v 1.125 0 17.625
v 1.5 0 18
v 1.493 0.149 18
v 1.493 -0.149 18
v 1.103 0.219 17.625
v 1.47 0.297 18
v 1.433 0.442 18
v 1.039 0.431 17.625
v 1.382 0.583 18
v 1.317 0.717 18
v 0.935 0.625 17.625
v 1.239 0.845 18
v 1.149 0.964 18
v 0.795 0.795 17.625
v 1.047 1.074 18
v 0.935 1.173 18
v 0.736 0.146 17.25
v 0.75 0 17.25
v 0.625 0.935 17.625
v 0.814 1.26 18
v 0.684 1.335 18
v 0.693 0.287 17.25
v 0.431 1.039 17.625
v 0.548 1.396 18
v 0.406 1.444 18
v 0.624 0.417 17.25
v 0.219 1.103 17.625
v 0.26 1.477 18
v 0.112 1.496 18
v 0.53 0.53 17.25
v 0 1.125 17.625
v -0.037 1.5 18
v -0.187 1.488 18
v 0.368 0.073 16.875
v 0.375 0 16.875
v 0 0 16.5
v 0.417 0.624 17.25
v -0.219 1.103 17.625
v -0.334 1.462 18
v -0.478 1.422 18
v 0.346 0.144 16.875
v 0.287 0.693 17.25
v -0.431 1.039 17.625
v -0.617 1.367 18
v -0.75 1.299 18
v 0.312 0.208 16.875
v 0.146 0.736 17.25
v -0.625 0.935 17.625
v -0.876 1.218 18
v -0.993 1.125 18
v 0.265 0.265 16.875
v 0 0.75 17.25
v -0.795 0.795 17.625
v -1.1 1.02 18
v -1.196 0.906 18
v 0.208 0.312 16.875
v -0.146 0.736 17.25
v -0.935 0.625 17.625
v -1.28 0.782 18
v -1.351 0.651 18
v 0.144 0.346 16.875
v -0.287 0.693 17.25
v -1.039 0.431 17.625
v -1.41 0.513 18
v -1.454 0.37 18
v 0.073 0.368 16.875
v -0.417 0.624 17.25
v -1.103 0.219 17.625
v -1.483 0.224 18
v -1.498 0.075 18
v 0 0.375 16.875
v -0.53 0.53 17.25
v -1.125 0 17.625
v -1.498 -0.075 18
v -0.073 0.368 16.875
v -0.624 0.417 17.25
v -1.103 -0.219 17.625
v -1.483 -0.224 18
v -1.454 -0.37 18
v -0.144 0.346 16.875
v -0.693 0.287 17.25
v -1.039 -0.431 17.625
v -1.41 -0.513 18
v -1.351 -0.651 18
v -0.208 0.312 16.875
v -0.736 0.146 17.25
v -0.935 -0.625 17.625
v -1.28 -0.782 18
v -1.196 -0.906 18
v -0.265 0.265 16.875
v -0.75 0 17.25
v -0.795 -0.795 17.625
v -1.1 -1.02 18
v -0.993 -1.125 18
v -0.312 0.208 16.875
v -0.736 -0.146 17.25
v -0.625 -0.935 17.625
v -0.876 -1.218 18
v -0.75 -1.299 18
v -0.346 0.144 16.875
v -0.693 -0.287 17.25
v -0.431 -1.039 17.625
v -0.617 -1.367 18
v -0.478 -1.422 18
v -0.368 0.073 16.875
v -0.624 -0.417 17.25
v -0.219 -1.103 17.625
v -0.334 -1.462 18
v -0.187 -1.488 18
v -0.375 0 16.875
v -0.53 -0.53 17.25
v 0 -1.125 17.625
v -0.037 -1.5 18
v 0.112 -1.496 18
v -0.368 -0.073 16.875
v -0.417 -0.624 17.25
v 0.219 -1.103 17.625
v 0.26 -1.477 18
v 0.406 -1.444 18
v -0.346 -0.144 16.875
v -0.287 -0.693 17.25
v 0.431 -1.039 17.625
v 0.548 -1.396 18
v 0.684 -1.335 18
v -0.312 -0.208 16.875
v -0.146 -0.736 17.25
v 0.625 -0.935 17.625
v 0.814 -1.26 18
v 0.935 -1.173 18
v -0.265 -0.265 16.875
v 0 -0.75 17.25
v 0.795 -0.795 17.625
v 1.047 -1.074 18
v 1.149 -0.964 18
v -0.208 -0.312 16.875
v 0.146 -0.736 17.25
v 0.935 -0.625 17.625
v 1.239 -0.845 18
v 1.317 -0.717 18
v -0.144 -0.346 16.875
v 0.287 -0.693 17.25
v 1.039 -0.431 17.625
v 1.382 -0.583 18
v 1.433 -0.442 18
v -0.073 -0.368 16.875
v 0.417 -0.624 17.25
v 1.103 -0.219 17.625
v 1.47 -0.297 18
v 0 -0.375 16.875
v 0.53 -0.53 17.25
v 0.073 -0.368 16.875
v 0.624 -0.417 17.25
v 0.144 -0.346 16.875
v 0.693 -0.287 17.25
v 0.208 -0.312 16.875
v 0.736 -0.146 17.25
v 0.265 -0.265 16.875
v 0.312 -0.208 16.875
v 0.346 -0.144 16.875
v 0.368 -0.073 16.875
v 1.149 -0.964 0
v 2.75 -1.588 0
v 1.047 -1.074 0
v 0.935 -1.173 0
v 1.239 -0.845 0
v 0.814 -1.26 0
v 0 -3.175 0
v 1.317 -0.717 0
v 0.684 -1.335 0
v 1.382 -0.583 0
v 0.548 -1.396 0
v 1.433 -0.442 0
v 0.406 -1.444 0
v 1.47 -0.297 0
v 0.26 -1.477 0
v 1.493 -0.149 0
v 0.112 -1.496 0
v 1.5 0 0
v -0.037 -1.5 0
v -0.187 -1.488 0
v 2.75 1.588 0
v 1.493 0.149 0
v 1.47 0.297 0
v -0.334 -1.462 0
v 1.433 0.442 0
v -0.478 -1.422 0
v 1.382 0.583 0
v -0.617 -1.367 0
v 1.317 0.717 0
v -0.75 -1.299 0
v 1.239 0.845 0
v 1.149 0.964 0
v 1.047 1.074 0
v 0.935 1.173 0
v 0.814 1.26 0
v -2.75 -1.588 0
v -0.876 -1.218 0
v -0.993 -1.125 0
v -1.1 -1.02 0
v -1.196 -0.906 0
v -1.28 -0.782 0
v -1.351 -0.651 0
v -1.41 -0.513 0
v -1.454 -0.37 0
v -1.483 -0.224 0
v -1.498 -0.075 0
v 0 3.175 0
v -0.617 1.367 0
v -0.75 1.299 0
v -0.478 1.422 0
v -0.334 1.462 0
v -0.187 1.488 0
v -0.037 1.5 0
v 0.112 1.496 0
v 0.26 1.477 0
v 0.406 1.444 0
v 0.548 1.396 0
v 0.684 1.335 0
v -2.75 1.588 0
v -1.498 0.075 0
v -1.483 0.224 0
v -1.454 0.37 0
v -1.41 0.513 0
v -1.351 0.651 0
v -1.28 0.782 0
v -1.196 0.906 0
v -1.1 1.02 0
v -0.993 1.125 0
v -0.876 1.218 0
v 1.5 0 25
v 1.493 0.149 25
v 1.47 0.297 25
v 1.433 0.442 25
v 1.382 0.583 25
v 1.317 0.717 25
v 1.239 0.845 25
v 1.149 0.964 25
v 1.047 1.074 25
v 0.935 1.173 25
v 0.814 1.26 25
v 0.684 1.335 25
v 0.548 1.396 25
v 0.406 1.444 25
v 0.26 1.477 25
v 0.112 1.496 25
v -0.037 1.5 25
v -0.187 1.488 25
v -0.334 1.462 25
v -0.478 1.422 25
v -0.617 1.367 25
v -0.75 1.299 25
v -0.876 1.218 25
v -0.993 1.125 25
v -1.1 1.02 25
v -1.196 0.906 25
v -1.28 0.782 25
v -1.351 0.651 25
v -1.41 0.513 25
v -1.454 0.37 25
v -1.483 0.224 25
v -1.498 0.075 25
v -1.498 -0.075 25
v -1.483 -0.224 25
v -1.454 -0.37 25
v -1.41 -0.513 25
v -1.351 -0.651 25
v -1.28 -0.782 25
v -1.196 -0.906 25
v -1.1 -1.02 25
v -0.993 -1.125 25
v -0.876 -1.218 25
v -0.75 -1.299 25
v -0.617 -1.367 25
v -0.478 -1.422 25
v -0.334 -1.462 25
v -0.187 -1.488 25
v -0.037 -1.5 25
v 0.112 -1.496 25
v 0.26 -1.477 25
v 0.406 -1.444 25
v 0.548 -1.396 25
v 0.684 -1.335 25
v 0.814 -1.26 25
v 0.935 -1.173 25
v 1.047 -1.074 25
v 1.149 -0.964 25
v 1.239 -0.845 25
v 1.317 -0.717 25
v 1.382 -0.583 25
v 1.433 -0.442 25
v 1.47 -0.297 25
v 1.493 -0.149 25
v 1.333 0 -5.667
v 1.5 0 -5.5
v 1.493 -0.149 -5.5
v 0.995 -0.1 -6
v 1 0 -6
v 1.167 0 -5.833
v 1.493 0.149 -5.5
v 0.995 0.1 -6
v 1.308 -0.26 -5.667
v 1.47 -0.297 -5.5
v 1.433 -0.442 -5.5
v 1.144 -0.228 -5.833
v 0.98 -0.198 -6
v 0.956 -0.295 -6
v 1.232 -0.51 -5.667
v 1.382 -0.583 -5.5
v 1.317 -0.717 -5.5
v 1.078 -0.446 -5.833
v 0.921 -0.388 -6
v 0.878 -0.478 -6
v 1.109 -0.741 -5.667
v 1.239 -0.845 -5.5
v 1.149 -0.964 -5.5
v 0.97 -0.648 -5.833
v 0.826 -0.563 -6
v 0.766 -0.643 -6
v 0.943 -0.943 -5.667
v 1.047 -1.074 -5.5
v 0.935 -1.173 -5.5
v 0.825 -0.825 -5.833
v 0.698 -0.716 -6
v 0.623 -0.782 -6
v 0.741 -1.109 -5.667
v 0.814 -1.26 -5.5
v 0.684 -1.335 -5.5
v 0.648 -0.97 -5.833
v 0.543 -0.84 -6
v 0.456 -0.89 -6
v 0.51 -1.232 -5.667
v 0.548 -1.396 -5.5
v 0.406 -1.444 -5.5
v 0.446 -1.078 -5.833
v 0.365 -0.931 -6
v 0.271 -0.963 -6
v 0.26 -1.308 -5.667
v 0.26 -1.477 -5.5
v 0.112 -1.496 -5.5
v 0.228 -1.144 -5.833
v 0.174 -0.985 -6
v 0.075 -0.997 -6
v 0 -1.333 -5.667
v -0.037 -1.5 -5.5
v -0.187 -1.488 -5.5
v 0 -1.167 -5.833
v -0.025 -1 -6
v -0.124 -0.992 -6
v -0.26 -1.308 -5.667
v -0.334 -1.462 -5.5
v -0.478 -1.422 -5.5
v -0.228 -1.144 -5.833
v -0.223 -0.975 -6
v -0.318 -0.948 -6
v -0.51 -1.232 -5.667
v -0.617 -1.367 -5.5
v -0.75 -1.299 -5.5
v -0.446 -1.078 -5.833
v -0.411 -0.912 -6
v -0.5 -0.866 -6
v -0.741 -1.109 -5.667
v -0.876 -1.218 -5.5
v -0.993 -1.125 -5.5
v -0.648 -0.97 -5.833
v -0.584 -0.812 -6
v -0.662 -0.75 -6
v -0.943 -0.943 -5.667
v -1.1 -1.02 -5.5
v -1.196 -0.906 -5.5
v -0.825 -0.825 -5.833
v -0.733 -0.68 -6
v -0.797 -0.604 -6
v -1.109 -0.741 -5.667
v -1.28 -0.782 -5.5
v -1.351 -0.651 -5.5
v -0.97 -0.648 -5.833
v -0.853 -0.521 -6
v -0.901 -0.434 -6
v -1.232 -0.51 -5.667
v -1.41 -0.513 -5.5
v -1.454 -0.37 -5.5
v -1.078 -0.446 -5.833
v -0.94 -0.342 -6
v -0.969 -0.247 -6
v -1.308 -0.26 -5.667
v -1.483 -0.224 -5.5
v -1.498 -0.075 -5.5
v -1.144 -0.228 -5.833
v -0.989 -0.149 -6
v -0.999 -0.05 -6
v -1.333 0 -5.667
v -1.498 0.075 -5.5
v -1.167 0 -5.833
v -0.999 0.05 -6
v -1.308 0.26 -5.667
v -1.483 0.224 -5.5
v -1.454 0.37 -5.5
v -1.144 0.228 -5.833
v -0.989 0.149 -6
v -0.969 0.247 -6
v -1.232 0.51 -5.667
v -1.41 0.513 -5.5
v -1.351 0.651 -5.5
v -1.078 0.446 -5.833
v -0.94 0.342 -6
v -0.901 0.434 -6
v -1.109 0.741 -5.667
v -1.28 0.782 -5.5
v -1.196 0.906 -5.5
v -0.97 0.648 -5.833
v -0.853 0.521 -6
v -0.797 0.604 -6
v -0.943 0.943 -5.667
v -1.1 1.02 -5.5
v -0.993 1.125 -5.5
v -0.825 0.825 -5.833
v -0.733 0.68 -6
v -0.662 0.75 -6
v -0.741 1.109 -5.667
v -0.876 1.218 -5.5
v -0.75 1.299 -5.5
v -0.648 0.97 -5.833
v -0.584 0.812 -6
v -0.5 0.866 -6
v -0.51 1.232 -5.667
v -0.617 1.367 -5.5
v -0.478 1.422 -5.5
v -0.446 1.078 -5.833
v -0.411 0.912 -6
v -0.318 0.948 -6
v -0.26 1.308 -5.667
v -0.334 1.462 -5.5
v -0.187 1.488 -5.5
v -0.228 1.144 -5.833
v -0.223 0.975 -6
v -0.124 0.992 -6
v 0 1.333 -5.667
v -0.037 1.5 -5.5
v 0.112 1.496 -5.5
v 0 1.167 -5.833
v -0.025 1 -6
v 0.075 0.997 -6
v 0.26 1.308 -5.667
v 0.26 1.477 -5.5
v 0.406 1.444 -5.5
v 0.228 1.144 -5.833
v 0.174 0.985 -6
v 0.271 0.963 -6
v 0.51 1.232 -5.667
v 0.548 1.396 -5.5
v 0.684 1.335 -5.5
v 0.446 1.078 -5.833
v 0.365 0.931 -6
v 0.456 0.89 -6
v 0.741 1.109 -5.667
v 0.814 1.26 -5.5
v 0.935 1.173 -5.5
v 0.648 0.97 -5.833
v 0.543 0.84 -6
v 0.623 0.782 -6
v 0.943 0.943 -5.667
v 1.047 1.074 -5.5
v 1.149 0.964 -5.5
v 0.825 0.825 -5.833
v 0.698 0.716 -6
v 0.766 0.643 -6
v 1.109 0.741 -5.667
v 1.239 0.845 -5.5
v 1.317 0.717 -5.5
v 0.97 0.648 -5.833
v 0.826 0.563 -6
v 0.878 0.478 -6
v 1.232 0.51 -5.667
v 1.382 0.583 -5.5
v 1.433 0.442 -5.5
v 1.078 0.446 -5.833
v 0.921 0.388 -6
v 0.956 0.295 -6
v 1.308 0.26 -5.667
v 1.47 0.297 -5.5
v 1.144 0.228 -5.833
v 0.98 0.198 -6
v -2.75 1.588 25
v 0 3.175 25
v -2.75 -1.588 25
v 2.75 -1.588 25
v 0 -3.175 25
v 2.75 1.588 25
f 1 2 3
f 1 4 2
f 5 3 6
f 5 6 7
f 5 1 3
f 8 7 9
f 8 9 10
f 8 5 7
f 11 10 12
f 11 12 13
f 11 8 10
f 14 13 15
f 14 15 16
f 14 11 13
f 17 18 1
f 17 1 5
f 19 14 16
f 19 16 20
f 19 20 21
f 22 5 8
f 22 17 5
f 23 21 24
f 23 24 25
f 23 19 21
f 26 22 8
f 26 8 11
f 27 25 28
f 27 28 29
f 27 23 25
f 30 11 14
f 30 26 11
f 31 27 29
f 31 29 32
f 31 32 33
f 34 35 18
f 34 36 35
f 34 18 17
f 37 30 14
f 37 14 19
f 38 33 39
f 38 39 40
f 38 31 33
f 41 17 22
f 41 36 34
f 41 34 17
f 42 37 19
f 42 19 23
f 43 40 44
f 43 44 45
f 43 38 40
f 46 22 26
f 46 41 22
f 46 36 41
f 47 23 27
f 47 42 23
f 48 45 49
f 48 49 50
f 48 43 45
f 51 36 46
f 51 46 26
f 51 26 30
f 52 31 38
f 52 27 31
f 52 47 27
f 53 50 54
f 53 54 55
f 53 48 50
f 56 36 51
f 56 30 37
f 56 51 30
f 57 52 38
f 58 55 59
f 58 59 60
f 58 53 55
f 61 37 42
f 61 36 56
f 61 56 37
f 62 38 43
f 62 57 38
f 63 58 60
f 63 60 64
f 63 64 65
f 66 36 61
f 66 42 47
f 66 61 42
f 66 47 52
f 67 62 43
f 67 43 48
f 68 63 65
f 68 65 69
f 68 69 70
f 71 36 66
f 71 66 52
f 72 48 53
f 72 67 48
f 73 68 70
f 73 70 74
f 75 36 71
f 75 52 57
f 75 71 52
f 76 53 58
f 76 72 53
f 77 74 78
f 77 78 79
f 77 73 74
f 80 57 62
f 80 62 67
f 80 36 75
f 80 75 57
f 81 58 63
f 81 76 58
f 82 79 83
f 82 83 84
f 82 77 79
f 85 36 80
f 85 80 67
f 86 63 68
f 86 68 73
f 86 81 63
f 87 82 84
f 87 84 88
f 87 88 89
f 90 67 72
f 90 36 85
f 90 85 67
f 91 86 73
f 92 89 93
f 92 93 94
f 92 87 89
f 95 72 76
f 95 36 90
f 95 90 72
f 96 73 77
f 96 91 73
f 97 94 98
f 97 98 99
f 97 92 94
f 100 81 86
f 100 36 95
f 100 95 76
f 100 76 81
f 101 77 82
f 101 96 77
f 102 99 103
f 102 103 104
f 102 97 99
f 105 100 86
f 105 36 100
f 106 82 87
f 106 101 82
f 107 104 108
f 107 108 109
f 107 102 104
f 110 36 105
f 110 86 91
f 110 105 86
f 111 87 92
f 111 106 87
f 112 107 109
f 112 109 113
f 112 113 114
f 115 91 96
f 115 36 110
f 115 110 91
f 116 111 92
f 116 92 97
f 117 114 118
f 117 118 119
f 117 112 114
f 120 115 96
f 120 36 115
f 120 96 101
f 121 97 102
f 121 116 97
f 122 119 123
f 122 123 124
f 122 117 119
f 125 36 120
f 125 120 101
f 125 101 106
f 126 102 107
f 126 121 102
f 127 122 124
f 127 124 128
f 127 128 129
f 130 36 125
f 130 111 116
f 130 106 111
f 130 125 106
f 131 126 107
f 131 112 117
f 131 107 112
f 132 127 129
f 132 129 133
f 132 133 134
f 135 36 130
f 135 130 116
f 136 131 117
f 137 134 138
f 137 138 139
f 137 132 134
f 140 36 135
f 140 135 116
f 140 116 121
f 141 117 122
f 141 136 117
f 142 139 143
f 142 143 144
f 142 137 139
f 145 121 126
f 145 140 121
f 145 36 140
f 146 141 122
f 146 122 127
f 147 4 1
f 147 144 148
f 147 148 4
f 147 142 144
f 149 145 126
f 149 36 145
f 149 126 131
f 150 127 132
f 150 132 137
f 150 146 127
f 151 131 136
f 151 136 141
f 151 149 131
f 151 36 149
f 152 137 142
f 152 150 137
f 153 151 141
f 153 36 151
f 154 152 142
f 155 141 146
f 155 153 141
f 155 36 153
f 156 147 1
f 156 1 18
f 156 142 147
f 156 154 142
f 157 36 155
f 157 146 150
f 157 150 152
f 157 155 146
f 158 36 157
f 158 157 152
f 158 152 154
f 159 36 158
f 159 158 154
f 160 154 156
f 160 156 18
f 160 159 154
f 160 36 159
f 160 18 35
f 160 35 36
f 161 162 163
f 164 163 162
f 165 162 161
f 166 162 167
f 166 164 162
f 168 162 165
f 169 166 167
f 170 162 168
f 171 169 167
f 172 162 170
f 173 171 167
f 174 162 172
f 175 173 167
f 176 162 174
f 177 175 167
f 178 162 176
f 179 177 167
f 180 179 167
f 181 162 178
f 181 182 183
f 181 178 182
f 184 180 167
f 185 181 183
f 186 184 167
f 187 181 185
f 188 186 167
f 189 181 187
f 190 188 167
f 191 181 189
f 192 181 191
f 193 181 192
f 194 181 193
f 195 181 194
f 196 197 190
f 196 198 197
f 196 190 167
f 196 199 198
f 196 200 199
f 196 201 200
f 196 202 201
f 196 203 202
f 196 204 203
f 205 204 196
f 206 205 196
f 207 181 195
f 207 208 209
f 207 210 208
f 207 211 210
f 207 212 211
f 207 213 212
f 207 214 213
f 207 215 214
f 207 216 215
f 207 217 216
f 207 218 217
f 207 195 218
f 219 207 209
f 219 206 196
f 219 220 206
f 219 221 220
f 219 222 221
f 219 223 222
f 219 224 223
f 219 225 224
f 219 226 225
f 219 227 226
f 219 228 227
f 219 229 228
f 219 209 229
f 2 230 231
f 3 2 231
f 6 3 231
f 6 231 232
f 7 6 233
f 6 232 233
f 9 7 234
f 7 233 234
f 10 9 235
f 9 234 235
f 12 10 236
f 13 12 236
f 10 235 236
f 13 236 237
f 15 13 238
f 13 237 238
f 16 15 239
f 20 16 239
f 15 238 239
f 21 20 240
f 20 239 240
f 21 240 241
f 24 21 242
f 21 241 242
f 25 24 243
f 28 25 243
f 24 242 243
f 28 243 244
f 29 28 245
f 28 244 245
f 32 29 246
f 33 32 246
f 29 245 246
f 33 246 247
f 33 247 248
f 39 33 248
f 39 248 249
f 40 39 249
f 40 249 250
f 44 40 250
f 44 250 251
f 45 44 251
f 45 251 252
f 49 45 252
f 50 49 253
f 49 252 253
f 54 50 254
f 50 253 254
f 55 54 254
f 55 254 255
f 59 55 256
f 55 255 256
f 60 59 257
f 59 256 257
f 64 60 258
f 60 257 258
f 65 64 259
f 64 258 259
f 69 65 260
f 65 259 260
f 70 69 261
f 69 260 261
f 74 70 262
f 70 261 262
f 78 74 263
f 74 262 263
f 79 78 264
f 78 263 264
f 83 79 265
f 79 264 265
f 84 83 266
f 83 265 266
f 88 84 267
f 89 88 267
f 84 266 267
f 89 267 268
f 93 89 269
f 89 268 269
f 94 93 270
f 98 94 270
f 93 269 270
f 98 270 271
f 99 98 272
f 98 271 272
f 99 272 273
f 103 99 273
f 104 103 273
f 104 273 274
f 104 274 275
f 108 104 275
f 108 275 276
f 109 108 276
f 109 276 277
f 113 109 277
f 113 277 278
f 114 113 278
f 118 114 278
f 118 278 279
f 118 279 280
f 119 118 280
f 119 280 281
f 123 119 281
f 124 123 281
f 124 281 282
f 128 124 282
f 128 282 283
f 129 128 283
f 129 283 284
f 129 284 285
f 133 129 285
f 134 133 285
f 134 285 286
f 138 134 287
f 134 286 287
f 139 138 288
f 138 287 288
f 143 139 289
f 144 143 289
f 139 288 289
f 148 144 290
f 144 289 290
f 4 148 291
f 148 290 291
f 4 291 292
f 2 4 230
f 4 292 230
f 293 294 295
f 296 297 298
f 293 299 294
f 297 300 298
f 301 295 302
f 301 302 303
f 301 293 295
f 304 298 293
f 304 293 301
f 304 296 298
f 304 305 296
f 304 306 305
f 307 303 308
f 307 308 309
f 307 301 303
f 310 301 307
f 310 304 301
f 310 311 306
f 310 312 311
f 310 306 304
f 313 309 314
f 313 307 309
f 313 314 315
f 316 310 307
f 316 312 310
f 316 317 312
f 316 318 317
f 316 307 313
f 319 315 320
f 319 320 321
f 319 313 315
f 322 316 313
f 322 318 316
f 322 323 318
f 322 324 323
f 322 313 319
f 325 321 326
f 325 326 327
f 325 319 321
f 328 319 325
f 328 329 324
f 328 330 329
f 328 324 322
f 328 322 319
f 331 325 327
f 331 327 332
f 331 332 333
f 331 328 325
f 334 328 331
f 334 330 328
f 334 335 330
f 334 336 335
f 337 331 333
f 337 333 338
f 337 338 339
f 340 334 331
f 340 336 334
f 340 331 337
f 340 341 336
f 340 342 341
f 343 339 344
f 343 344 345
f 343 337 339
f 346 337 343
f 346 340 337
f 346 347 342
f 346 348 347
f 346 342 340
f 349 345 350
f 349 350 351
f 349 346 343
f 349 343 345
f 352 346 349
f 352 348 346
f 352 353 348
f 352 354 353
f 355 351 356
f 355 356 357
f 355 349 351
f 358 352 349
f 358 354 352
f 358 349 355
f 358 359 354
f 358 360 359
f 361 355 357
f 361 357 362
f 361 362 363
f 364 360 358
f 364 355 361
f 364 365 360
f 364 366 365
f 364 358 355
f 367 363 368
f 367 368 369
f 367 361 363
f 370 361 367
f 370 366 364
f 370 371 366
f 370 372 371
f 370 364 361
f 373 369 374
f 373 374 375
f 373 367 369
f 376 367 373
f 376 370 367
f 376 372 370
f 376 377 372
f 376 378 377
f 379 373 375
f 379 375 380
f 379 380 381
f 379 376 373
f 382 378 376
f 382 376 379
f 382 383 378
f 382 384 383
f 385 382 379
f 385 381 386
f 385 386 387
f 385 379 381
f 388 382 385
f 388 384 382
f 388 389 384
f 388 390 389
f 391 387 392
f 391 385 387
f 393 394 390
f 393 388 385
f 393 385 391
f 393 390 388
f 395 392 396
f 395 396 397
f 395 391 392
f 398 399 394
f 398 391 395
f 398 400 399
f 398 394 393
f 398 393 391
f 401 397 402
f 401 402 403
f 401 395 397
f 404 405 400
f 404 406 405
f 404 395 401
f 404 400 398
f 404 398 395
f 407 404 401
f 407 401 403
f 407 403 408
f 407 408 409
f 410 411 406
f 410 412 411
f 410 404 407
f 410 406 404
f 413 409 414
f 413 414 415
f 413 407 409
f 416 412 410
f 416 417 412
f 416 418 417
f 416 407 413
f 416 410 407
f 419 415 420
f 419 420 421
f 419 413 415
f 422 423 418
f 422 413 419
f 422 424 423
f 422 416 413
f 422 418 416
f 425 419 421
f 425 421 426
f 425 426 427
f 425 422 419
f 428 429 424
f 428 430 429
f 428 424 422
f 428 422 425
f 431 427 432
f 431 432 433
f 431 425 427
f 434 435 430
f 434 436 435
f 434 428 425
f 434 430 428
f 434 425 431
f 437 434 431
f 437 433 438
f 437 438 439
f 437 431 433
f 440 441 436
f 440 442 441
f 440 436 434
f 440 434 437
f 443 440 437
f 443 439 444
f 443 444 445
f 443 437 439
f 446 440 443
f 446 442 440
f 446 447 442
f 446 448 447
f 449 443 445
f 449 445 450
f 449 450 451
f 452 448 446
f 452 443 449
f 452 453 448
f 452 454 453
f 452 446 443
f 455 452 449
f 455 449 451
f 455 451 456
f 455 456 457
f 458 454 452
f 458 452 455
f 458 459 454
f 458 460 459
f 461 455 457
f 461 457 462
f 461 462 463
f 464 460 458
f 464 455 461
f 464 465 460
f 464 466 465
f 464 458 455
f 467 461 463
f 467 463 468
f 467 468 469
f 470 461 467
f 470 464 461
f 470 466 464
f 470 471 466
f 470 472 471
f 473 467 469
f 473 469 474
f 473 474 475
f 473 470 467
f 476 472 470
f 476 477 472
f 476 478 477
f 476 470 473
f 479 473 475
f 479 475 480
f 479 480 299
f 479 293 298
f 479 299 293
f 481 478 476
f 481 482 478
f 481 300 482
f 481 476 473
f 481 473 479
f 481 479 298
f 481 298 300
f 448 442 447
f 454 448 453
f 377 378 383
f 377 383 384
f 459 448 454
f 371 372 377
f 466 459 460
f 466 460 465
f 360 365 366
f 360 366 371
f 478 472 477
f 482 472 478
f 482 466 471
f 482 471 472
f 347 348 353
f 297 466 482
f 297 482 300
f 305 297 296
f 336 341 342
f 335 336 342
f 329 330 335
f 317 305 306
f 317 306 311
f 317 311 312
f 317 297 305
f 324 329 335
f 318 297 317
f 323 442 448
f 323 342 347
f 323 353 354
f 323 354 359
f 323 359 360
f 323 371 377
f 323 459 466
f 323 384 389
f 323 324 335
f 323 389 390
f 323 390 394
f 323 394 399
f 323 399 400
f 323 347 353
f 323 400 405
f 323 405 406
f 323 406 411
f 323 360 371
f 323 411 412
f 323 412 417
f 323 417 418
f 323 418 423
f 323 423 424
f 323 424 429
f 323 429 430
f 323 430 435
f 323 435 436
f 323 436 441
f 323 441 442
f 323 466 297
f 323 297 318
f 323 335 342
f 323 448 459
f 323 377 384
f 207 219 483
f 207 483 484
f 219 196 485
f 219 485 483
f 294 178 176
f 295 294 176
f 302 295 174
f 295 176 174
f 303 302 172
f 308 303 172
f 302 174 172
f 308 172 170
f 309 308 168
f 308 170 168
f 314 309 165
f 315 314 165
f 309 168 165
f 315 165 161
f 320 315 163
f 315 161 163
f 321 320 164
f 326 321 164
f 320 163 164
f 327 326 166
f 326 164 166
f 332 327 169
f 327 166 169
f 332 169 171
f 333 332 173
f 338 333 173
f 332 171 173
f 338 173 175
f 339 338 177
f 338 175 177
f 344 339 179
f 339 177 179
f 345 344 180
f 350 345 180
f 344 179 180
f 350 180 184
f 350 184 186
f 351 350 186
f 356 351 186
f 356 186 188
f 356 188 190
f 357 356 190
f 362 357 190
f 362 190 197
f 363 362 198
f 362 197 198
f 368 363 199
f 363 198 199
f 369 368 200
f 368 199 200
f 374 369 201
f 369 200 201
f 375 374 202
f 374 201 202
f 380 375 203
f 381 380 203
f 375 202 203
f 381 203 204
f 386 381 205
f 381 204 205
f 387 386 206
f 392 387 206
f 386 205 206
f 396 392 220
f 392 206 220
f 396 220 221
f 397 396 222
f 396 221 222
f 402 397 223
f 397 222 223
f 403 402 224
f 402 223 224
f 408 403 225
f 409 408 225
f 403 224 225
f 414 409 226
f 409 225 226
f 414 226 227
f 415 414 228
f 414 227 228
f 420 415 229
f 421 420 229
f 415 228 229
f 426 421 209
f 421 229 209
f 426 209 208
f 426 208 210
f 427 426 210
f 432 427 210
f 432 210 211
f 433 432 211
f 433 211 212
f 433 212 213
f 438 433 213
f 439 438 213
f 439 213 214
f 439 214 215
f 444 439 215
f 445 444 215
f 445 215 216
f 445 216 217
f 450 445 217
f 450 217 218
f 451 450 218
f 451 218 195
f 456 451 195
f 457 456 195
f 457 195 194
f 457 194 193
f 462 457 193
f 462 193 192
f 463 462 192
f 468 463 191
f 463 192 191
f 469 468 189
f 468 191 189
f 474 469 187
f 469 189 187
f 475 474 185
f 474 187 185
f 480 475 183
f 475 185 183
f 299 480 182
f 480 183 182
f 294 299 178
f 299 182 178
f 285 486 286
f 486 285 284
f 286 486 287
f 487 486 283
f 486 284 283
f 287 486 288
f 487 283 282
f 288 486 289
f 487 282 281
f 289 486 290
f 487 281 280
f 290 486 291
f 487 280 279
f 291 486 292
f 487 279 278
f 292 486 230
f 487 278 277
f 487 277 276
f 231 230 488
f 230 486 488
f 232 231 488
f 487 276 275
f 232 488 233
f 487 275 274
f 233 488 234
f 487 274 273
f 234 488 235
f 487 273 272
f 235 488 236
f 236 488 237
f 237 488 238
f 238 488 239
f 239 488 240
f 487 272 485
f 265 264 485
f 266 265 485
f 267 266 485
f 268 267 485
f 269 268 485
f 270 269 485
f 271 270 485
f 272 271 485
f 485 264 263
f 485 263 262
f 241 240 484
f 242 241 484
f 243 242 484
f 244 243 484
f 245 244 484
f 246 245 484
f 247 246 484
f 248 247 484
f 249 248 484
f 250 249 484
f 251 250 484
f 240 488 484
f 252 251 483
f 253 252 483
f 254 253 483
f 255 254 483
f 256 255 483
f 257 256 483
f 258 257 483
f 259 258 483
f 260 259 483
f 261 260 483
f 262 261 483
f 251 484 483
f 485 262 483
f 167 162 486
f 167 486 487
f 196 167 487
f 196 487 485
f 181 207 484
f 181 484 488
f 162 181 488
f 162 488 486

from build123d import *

# Parameters (mm, degrees)
PAD_DEPTH       = 25
SKETCH001_R     = 1.5
PAD001_DEPTH    = 6
SKETCH002_R     = 1.5
POCKET_DEPTH    = 8.5
CHAMFER_SIZE    = 1.5
CHAMFER001_SIZE = 0.5


with BuildPart() as part:
    # Sketch → Pad (new body)
    with BuildSketch(Plane.XY):
        Polygon((-2.75, -1.587713), (-2.75, 1.587713), (0, 3.175426), (2.75, 1.587713), (2.75, -1.587713), (0, -3.175426), align=None)
    extrude(amount=PAD_DEPTH)

    # Sketch001 (on Face7 of Pad) → Pad001 (new body)
    with BuildSketch(Plane(origin=(0, 0, 0), x_dir=(1, 0, 0), z_dir=(0, 0, -1))):
        Circle(SKETCH001_R)
    extrude(amount=PAD001_DEPTH)

    # Sketch002 (on Face5 of Pad001) → Pocket (cut)
    with BuildSketch(Plane.XY.offset(25)):
        Circle(SKETCH002_R)
    extrude(amount=-POCKET_DEPTH, mode=Mode.SUBTRACT)

    # Chamfer
    chamfer_edges = [part.edges().sort_by_distance(p)[0] for p in [
        (-1.5, 0, 16.5),
    ]]
    chamfer(chamfer_edges, length=CHAMFER_SIZE)

    # Chamfer001
    chamfer001_edges = [part.edges().sort_by_distance(p)[0] for p in [
        (-1.5, 0, -6),
    ]]
    chamfer(chamfer001_edges, length=CHAMFER001_SIZE)


solid = part.part
